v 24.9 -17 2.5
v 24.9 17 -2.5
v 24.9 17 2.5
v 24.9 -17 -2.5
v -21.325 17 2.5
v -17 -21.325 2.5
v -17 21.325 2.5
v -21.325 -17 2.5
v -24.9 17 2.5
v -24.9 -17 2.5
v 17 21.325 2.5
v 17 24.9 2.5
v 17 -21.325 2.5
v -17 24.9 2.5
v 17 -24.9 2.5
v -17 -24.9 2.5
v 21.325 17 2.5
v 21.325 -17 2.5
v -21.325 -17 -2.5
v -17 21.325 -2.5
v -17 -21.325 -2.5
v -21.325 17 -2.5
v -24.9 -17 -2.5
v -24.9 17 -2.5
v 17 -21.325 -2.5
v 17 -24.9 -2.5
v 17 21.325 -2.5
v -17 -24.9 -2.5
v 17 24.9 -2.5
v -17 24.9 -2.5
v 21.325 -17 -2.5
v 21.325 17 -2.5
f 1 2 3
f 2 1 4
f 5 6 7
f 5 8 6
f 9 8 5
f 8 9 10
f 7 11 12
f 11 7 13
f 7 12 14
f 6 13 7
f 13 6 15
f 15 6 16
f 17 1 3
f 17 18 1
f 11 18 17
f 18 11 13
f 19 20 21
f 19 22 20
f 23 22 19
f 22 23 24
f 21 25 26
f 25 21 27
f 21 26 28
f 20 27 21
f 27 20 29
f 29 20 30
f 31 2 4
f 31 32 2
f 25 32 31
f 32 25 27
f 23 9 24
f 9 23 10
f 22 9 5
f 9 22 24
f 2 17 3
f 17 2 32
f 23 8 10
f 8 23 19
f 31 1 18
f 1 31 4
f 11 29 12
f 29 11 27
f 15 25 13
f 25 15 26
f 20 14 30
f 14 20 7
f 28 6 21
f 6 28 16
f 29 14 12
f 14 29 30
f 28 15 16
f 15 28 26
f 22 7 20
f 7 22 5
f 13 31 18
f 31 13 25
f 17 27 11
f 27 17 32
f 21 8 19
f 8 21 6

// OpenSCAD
//Cube insert: Perpendicular 
// Is this insert for a 3D printed cube or for a cube produced by injection molding?
3D_printed_cube = "IM"; // [IM, 3Dprint]

/* [Hiden] */
$fn = 80;
eps = .002;
a = 49.8;
b = 33.6;
c = 6.28;
d = 53.8;
h = 5;
IM_offset = 3D_printed_cube == "3Dprint" ? 0 : 0.2;

insert();

module insert() {
    union() {   //basic insert design
            cube([a,b+2*IM_offset,h], center=true);
            cube([b+2*IM_offset,a,h], center=true);
            rotate(a=[0,0,45]){
                cube([c,d+2*IM_offset,h], center=true);
            }
            rotate(a=[0,0,-45]){
                cube([c,d+2*IM_offset,h], center=true);
            }
        }
}
